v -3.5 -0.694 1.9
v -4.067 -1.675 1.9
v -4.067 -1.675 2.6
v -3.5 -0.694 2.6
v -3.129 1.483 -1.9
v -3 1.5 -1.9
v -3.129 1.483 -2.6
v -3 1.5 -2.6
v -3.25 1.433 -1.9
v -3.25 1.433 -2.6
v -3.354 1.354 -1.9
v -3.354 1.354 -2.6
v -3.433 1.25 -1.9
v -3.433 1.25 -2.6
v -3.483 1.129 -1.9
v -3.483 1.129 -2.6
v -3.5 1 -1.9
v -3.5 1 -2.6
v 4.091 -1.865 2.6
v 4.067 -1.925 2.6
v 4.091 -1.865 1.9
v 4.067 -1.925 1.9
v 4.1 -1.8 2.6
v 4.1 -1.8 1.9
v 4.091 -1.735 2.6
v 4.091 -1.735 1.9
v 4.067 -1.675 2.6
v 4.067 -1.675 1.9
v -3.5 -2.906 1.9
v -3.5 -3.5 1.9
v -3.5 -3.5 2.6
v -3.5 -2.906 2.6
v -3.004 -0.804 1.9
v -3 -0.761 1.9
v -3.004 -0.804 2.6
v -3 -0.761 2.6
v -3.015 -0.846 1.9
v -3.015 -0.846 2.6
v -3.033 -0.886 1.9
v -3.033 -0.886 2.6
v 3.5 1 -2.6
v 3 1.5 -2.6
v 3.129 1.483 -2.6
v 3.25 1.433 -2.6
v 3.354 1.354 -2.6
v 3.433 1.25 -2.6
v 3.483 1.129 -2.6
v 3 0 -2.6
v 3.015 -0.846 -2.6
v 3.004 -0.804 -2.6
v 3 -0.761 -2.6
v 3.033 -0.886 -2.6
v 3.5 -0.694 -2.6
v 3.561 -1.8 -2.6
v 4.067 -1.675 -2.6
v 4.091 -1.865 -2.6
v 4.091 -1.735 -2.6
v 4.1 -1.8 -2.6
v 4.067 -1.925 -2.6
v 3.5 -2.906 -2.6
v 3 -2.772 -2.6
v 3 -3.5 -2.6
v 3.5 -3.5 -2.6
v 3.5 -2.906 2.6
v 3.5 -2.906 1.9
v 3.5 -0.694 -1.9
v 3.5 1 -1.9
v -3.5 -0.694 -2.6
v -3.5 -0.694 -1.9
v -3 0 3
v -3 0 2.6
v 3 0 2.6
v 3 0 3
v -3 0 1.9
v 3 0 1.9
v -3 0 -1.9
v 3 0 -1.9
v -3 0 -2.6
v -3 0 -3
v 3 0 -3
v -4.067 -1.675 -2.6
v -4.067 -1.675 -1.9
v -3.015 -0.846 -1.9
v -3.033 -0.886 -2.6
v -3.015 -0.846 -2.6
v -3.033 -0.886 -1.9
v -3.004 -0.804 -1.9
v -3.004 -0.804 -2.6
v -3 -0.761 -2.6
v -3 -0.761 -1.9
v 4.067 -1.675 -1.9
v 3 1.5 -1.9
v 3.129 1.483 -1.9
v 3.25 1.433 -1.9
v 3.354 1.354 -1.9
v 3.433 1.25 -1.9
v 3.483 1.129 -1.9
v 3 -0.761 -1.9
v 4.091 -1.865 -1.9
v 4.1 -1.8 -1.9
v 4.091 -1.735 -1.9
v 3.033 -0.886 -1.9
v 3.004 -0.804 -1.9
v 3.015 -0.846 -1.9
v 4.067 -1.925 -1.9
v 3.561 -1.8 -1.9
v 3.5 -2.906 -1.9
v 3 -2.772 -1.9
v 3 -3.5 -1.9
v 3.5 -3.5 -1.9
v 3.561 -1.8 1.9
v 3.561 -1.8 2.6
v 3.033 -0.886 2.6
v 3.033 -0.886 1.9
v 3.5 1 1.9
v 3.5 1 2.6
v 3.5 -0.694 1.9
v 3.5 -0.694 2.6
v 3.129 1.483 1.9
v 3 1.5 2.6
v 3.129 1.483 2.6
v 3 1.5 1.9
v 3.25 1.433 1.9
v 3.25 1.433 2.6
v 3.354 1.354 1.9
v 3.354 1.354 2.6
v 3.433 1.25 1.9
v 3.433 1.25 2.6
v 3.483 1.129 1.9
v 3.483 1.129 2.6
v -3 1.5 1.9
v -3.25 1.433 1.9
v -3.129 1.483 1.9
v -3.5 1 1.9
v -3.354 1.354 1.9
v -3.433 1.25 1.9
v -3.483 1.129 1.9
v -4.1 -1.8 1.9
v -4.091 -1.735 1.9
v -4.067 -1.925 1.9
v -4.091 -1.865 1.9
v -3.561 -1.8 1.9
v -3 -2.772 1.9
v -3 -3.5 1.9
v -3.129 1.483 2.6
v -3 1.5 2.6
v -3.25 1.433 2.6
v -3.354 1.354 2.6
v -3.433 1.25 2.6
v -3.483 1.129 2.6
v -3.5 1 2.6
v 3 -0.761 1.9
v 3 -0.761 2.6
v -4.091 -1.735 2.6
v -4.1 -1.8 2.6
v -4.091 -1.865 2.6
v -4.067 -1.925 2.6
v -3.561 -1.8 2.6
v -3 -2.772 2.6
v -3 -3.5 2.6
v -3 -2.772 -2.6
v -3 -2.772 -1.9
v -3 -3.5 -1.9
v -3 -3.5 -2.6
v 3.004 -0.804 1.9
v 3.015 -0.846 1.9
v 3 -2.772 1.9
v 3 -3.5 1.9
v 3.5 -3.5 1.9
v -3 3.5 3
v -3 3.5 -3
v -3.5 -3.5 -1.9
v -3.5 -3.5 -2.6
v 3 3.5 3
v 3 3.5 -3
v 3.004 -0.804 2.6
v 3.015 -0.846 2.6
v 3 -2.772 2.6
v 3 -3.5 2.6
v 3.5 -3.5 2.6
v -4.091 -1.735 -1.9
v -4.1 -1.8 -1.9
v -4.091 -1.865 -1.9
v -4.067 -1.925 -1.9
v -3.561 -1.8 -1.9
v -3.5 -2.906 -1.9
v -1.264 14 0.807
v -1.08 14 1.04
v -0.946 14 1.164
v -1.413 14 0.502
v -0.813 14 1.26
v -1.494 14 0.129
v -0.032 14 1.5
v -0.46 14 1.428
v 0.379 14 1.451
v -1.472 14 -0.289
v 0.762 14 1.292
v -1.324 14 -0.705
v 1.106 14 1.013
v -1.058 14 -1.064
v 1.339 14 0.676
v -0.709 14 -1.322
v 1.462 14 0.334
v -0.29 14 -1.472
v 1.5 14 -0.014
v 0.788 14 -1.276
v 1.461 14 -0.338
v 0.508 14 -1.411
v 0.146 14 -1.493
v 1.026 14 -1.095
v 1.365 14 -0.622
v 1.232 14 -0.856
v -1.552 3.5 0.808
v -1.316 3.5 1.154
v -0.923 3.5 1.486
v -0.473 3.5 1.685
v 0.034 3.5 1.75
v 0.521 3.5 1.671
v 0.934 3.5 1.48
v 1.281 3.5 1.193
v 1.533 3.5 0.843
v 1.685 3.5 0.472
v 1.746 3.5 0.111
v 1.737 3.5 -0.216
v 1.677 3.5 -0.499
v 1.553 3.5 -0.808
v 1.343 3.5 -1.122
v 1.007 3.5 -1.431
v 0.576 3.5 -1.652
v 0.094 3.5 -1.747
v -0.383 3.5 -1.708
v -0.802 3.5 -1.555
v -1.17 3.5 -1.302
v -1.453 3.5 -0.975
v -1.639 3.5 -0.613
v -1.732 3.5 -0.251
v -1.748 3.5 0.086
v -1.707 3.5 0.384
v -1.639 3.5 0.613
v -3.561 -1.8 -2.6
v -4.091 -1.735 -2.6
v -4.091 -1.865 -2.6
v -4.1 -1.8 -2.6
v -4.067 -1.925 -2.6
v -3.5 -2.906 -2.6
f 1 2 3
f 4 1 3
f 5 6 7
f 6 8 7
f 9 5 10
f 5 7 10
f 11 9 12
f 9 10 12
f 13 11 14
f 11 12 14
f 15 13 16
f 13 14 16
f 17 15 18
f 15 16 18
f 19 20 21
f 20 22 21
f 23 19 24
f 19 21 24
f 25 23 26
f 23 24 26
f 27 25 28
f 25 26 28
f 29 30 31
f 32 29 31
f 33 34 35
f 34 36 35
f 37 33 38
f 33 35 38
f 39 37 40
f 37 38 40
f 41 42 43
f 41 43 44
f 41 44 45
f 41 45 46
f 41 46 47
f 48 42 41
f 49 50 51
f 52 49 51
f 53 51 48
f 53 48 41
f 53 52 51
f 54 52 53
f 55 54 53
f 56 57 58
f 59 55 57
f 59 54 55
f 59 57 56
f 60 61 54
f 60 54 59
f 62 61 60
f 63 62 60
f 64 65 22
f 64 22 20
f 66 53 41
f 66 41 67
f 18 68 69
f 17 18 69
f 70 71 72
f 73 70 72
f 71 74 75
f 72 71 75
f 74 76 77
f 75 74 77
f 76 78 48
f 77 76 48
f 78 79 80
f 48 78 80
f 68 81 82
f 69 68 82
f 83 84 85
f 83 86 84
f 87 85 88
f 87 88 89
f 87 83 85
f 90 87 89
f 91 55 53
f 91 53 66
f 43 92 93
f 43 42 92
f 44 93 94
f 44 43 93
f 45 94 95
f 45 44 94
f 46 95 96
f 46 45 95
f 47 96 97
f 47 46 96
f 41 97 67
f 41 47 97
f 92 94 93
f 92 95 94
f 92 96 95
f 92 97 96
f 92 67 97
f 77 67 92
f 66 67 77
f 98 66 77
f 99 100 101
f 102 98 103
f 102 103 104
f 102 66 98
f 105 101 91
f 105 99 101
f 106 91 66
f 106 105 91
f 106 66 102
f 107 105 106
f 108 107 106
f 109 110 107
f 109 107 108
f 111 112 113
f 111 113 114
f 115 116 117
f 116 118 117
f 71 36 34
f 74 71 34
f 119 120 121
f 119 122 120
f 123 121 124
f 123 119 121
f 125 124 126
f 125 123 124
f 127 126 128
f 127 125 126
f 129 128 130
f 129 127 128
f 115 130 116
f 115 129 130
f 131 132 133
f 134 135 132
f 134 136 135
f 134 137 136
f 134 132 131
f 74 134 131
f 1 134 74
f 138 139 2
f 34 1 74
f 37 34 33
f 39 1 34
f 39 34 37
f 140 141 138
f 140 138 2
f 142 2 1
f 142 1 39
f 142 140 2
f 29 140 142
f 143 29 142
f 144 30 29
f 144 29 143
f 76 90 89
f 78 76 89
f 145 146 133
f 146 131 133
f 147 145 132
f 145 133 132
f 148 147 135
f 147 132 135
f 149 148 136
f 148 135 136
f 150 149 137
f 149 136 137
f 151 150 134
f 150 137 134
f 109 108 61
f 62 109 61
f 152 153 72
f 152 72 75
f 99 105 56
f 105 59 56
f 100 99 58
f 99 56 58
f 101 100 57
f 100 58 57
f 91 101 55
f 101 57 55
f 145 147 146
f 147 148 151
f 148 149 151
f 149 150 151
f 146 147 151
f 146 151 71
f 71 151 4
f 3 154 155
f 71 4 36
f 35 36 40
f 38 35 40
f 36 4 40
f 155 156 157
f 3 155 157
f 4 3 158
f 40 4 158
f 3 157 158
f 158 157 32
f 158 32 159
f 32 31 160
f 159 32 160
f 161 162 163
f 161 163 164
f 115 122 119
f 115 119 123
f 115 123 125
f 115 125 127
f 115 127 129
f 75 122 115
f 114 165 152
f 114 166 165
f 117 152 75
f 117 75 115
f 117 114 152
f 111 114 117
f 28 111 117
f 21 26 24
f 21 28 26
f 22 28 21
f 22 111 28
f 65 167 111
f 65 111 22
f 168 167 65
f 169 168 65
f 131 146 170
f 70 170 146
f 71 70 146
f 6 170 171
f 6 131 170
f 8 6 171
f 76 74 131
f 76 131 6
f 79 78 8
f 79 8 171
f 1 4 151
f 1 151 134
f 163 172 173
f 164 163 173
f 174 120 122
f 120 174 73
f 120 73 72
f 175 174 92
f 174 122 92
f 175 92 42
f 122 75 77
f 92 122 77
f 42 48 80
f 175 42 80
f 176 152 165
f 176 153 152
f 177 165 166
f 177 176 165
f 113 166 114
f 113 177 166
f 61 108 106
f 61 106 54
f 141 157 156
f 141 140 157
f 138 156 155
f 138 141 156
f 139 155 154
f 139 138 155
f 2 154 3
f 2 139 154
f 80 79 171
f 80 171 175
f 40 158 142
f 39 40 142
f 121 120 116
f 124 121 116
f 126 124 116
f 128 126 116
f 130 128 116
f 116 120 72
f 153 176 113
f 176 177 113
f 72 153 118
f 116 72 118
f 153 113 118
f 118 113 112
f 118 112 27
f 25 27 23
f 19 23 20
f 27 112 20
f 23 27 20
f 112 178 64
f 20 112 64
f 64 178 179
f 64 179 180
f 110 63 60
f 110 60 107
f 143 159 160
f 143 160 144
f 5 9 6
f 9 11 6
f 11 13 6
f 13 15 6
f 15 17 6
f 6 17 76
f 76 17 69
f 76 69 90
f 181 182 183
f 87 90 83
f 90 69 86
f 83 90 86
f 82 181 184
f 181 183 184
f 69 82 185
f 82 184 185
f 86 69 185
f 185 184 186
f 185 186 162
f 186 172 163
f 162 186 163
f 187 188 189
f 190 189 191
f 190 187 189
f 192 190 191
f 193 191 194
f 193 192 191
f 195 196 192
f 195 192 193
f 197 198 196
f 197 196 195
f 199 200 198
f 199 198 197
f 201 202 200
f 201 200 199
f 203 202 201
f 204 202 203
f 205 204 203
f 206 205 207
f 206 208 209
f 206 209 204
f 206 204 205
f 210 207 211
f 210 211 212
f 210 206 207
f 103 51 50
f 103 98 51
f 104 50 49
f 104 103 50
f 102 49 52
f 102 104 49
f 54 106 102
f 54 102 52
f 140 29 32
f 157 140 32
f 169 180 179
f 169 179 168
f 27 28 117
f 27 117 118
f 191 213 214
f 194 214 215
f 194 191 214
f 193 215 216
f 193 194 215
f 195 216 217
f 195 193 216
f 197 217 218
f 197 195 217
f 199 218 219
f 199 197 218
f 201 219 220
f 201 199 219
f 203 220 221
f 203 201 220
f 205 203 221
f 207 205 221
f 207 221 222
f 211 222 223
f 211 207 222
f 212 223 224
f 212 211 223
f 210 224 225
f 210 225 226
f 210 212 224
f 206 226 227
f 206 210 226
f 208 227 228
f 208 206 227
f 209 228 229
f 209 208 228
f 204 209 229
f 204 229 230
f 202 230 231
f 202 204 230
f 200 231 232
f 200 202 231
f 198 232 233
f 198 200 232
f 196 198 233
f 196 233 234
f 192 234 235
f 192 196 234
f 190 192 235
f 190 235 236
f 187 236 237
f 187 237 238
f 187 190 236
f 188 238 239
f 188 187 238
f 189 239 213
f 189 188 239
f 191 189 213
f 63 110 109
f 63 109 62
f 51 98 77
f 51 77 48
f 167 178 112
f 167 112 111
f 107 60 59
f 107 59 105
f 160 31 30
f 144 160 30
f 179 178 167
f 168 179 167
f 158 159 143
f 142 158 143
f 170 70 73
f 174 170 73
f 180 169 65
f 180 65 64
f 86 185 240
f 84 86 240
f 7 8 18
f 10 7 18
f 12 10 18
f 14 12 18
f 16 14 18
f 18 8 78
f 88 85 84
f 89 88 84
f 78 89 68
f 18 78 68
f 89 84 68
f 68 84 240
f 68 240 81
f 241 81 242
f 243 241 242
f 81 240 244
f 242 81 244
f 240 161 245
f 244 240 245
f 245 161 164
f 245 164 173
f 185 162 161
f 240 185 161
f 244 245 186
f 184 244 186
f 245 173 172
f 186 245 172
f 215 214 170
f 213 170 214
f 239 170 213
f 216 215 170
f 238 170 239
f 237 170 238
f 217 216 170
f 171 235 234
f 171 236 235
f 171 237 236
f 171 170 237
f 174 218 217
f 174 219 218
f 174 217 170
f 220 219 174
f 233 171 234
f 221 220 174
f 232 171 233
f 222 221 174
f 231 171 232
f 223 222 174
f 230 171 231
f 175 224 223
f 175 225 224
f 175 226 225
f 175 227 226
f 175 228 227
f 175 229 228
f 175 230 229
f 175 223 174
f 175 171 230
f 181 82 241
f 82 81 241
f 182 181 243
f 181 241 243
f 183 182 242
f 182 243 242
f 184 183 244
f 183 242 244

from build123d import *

# Parameters (mm, degrees)
SKETCH1_W           = 6
SKETCH1_H           = 6
BOSS_EXTRUDE1_DEPTH = 3.5
SKETCH1_3_W         = 0.5
SKETCH1_3_H         = 0.7
BOSS_EXTRUDE2_DEPTH = 1.5
FILLET1_R           = 0.5
SKETCH10_W          = 0.5
SKETCH10_H          = 0.7
FILLET2_R           = 0.25


with BuildPart() as part:
    # Sketch1 → Boss-Extrude1 (new body)
    with BuildSketch(Plane(origin=(0, 0, 0), x_dir=(1, 0, 0), z_dir=(0, 1, 0))):
        Rectangle(SKETCH1_W, SKETCH1_H)
    extrude(amount=BOSS_EXTRUDE1_DEPTH)

    # Loft1: read off the stored shape, not the designer's step
    # Loft1: loft between two sections, ruled curve by curve
    loft1_from = [
        Edge.make_bspline([(-1.552212541, 3.5, 0.80816844), (0.064124339, 3.5, 3.912593522), (3.168549421, 3.5, 2.296256642), (1.552212541, 3.5, -0.80816844), (-0.064124339, 3.5, -3.912593522), (-3.168549421, 3.5, -2.296256642), (-1.552212541, 3.5, 0.80816844)], [0, 0, 0, 0, 0.5, 0.5, 0.5, 1, 1, 1, 1], 3, [1, 0.333333333, 0.333333333, 1, 0.333333333, 0.333333333, 1]),
    ]
    loft1_to = [
        Edge.make_bspline([(-0.81326638, 14, 1.260395888), (1.707525396, 14, 2.886928648), (3.334058157, 14, 0.366136872), (0.81326638, 14, -1.260395888), (-1.707525396, 14, -2.886928648), (-3.334058157, 14, -0.366136872), (-0.81326638, 14, 1.260395888)], [0, 0, 0, 0, 0.5, 0.5, 0.5, 1, 1, 1, 1], 3, [1, 0.333333333, 0.333333333, 1, 0.333333333, 0.333333333, 1]),
    ]
    loft1 = Solid(Shell([*[Face.make_surface_from_curves(loft1_from[k], loft1_to[k]) for k in range(1)], Face(Wire(loft1_from)), Face(Wire(loft1_to))]))
    add(loft1)

    # Sketch1<3> → Boss-Extrude2 (add)
    with BuildSketch(Plane(origin=(0, 0, 0), x_dir=(1, 0, 0), z_dir=(0, 1, 0))):
        with Locations((3.25, -2.25)):
            Rectangle(SKETCH1_3_W, SKETCH1_3_H)
        with Locations((3.25, 2.25)):
            Rectangle(SKETCH1_3_W, SKETCH1_3_H)
        with Locations((-3.25, 2.25)):
            Rectangle(SKETCH1_3_W, SKETCH1_3_H)
        with Locations((-3.25, -2.25)):
            Rectangle(SKETCH1_3_W, SKETCH1_3_H)
    extrude(amount=BOSS_EXTRUDE2_DEPTH)

    # Fillet1
    fillet1_edges = [part.edges().sort_by_distance(p)[0] for p in [
        (3.5, 1.5, 2.25),
        (3.5, 1.5, -2.25),
        (-3.5, 1.5, 2.25),
        (-3.5, 1.5, -2.25),
    ]]
    fillet(fillet1_edges, radius=FILLET1_R - 0.0001)  # a hair under: the kernel refuses the full size

    # Sweep5: sweep along a path in Sketch8
    with BuildLine(Plane.XY.offset(2.3)) as sweep5_path:
        Line((3.25, 0), (3.25, -0.760769515))
        Line((3.25, -0.760769515), (3.85, -1.8))
        Line((3.85, -1.8), (3.25, -2.839230485))
        Line((3.25, -2.839230485), (3.25, -3.5))
    # Sketch10 → Sweep5 (sweep)
    with BuildSketch(Plane(origin=(0, -3.5, 0), x_dir=(-1, 0, 0), z_dir=(0, -1, 0))):
        with Locations((-3.25, 2.25)):
            Rectangle(SKETCH10_W, SKETCH10_H)
        with Locations((-3.25, -2.25)):
            Rectangle(SKETCH10_W, SKETCH10_H)
    sweep5 = sweep(path=sweep5_path.line, transition=Transition.RIGHT)

    # Mirror1: Sweep5 across plane
    add(sweep5.mirror(Plane(origin=(0, 0, 0), x_dir=(0, 0, 1), z_dir=(1, 0, 0))))

    # Fillet2
    fillet2_edges = [part.edges().sort_by_distance(p)[0] for p in [
        (4.138675135, -1.8, -2.25),
        (3, -0.827756814, -2.25),
        (4.138675135, -1.8, 2.25),
        (3, -0.827756814, 2.25),
        (-4.138675135, -1.8, -2.25),
        (-3, -0.827756814, -2.25),
        (-4.138675135, -1.8, 2.25),
        (-3, -0.827756814, 2.25),
    ]]
    fillet(fillet2_edges, radius=FILLET2_R)


solid = part.part
